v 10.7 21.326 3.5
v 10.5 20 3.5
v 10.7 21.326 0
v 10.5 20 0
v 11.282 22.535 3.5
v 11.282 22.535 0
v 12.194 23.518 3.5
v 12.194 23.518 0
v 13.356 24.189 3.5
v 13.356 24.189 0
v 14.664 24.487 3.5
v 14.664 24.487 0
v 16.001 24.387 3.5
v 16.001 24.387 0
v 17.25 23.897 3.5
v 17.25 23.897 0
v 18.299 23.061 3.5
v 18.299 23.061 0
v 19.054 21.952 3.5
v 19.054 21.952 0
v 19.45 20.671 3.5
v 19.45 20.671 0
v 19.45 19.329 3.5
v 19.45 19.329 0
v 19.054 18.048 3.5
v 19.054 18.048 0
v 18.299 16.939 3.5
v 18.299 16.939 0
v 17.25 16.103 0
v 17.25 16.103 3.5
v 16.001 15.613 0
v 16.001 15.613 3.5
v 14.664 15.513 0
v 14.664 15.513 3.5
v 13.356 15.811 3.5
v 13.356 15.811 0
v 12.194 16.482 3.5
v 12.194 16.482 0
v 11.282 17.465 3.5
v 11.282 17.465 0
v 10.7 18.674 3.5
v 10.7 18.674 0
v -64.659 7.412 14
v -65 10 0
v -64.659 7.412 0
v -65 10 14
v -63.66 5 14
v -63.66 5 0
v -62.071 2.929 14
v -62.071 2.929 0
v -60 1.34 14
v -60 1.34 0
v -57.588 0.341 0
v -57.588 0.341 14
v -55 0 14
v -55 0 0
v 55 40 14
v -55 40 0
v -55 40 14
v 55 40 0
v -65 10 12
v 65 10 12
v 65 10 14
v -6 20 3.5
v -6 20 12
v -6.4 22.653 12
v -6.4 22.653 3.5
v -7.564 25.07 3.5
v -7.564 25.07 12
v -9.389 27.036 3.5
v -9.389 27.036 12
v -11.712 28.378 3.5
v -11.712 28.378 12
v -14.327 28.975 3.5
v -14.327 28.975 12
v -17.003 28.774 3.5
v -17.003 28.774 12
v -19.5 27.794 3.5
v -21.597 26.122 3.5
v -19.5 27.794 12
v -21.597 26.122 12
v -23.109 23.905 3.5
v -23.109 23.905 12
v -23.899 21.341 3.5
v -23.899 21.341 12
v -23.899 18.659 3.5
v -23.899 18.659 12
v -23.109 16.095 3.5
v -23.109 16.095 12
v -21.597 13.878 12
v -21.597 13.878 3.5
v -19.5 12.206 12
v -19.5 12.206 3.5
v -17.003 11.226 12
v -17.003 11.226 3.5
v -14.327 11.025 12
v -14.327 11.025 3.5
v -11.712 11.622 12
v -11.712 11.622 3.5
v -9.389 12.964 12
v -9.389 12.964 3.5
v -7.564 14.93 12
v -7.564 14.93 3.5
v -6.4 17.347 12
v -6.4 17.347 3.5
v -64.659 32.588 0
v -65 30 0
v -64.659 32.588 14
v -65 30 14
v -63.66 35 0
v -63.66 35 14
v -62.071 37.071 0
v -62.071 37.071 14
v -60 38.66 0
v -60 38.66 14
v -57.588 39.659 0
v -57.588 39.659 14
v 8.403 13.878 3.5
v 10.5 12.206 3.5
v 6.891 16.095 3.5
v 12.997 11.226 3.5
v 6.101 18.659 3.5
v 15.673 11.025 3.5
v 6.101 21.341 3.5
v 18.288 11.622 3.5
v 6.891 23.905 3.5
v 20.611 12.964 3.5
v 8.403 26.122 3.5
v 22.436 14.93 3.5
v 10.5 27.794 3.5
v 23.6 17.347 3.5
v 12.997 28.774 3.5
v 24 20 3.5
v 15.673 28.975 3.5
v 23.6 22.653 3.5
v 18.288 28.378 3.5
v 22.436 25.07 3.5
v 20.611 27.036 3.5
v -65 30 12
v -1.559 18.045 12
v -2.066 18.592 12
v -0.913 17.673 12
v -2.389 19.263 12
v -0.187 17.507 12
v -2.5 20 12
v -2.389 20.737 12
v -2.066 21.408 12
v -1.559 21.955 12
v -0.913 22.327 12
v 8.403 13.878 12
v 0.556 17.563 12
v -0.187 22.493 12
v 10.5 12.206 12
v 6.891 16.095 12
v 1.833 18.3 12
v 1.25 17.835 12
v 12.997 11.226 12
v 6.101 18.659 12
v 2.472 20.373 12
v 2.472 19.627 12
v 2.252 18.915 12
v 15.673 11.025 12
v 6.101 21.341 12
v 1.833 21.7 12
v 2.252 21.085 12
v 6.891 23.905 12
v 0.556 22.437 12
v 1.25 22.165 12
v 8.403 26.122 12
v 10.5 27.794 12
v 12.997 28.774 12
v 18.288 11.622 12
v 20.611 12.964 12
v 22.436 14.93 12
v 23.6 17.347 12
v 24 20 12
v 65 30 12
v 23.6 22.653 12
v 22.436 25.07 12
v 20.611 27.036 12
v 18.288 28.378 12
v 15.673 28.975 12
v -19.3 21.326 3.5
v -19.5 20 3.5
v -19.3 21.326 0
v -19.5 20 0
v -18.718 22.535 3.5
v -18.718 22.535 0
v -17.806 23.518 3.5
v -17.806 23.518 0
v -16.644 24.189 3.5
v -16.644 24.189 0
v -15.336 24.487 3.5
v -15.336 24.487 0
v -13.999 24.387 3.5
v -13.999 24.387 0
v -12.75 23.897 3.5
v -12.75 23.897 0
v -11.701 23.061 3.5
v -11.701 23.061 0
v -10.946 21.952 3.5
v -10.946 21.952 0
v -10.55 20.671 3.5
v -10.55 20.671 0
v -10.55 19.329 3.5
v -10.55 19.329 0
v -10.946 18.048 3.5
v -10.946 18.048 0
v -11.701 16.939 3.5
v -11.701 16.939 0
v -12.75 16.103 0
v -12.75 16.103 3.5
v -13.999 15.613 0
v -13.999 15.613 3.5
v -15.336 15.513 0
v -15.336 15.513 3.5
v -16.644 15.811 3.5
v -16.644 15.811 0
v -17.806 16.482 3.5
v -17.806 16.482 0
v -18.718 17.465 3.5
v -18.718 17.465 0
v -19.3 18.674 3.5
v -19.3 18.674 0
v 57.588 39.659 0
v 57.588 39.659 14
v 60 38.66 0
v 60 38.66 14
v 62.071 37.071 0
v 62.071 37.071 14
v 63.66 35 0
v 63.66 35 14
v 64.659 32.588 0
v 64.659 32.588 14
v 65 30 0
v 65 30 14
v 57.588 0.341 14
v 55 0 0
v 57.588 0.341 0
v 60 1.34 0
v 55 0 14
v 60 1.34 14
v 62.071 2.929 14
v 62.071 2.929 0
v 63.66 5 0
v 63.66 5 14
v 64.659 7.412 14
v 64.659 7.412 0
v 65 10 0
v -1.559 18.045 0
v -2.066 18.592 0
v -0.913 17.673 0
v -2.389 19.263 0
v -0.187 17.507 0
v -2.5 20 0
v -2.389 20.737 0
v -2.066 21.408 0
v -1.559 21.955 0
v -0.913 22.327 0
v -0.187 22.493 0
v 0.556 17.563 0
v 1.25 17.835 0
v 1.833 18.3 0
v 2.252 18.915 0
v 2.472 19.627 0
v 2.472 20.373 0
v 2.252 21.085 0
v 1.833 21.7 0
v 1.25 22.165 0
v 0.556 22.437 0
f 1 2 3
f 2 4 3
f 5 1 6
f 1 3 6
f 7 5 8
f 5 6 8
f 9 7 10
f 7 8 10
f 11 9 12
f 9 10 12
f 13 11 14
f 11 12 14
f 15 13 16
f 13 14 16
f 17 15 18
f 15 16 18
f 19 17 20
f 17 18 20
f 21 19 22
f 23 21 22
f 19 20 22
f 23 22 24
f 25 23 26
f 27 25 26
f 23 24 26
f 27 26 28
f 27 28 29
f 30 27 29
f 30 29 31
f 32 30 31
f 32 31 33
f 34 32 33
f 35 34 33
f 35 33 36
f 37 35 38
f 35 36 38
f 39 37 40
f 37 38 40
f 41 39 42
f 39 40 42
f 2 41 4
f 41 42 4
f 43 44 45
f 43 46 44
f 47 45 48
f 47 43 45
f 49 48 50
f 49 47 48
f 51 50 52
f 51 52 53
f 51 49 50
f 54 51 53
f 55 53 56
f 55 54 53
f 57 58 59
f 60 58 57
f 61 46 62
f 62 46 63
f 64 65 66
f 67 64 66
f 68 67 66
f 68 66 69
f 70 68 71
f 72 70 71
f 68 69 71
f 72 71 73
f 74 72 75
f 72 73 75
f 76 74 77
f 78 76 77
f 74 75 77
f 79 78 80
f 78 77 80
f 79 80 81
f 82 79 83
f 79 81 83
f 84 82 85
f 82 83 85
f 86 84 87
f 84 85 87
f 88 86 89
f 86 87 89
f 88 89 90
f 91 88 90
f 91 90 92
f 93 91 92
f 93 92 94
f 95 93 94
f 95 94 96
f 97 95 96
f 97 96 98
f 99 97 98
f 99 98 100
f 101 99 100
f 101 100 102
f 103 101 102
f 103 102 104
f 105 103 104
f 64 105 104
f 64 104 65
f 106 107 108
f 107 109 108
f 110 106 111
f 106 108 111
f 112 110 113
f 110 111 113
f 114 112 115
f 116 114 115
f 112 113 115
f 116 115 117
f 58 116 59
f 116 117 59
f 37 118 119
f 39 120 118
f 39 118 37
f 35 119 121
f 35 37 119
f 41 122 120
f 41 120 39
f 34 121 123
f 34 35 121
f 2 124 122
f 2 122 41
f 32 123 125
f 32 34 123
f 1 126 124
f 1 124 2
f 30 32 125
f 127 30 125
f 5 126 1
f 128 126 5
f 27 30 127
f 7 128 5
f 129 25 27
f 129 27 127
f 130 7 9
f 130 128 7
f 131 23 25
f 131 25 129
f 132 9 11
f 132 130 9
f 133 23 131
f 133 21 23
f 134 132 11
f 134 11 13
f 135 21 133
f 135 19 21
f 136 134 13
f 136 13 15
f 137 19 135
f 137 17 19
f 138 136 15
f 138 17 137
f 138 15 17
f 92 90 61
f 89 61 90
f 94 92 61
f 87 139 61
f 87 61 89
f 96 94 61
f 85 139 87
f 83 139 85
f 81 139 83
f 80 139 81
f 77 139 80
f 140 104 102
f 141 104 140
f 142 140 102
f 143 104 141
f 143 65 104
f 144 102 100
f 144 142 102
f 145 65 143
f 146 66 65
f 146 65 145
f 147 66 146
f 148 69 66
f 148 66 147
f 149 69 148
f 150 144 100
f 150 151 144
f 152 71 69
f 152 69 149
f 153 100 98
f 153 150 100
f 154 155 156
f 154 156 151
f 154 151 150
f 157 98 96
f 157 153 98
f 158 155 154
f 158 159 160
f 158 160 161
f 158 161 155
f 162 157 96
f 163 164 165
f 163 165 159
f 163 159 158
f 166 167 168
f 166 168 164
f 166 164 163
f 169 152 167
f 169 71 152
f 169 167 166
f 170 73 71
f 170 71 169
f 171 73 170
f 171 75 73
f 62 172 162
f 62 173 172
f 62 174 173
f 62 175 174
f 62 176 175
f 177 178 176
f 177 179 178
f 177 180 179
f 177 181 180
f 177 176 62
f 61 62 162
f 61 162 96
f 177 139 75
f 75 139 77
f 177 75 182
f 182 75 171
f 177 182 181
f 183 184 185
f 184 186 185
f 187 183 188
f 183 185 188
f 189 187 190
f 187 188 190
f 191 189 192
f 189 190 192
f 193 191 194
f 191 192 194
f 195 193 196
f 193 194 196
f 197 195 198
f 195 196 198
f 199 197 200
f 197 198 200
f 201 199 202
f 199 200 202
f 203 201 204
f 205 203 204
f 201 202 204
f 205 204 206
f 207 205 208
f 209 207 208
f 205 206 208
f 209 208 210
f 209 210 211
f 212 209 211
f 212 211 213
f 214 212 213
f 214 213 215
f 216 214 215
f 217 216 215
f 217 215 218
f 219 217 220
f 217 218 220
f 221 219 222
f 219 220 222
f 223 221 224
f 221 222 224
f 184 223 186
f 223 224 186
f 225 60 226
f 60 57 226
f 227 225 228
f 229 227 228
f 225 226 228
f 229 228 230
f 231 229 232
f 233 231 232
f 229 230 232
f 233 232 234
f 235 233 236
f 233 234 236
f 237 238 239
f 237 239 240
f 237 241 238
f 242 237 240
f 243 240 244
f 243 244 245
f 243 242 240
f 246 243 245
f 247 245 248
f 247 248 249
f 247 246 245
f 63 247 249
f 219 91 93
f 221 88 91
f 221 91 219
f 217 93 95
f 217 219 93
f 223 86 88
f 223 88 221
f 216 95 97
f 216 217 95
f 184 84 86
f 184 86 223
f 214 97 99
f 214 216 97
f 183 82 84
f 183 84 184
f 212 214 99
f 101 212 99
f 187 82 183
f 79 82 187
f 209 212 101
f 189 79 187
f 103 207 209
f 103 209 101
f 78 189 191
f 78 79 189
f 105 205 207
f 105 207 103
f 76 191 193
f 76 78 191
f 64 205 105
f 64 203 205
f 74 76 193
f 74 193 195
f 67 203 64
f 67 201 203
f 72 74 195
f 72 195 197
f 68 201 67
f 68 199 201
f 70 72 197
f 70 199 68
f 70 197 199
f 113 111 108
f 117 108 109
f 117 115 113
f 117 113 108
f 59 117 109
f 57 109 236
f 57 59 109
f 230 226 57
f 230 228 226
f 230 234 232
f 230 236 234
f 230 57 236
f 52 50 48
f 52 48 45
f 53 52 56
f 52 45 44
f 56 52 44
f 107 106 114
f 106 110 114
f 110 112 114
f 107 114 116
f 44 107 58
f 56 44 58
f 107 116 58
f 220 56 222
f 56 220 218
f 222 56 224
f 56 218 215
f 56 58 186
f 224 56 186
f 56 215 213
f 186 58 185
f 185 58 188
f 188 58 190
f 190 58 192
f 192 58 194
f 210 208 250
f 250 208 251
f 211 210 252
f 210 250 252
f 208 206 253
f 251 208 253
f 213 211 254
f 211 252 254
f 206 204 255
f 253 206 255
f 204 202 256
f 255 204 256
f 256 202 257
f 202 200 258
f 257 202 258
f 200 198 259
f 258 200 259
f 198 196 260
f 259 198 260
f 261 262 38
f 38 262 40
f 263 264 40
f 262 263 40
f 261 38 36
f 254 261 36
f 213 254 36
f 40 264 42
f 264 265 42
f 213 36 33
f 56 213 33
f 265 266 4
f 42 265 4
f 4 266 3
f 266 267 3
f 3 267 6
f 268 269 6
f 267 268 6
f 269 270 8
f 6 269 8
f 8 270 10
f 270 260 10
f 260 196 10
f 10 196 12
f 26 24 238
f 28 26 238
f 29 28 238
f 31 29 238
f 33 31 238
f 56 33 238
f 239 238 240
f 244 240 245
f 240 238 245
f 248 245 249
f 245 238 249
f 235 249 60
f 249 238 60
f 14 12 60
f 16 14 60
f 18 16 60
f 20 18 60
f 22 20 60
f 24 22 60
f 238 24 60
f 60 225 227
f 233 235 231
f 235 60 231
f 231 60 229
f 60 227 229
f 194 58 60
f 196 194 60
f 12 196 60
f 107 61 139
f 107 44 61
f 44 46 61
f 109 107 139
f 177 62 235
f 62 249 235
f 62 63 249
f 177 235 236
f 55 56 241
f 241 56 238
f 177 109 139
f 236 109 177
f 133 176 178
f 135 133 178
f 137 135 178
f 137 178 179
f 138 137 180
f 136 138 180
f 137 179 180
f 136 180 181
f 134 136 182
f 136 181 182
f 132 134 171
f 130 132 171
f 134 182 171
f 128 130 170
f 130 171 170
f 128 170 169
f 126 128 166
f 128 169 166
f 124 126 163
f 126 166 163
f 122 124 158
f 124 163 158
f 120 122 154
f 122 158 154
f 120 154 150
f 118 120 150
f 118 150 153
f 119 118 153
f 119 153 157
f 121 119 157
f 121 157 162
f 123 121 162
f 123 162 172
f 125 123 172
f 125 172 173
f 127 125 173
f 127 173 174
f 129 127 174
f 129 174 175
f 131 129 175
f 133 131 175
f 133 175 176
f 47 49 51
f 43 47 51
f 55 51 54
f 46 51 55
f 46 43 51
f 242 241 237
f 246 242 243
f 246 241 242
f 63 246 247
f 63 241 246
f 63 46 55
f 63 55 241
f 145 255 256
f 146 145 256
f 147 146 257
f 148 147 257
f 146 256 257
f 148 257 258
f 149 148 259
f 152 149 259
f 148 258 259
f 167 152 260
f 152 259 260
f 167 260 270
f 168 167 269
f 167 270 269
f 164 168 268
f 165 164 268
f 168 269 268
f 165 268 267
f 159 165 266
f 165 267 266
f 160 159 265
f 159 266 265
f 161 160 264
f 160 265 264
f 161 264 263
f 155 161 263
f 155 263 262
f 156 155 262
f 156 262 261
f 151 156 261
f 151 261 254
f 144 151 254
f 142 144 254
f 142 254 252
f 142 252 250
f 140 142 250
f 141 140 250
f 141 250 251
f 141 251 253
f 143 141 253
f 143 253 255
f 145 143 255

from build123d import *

# Parameters (mm, degrees)
SKETCH_1_W                   = 130
SKETCH_1_H                   = 40
EXTRUDE_1_DEPTH              = 14
HOLE_WIZARD_M6_1_D           = 5
SKETCH_8_W                   = 130
SKETCH_8_H                   = 20
CUT_EXTRUDE_1_DEPTH          = 2
HOLE_WIZARD_M8_1_D           = 9
HOLE_WIZARD_M8_1_CBORE_D     = 18
HOLE_WIZARD_M8_1_CBORE_DEPTH = 8.5
FILLET_1_R                   = 10


with BuildPart() as part:
    # 草图1 → 凸台-拉伸1 (new body)
    with BuildSketch(Plane.XY):
        with Locations((0, 20)):
            Rectangle(SKETCH_1_W, SKETCH_1_H)
    extrude(amount=EXTRUDE_1_DEPTH)

    # M6 螺纹孔1 (through all)
    with Locations(Plane.XY.offset(14)):
        with Locations((0, 20)):
            Hole(HOLE_WIZARD_M6_1_D / 2)

    # 草图8 → 切除-拉伸1 (cut)
    with BuildSketch(Plane.XY.offset(14)):
        with Locations((0, 20)):
            Rectangle(SKETCH_8_W, SKETCH_8_H)
    extrude(amount=-CUT_EXTRUDE_1_DEPTH, mode=Mode.SUBTRACT)

    # M8 六角头螺栓的柱形沉头孔1 (through all)
    with Locations(Plane.XY.offset(12)):
        with Locations((-15, 20), (15, 20)):
            CounterBoreHole(HOLE_WIZARD_M8_1_D / 2, HOLE_WIZARD_M8_1_CBORE_D / 2, HOLE_WIZARD_M8_1_CBORE_DEPTH)

    # 圆角1
    fillet_1_edges = [part.edges().sort_by_distance(p)[0] for p in [
        (65, 0, 7),
        (65, 40, 7),
        (-65, 0, 7),
        (-65, 40, 7),
    ]]
    fillet(fillet_1_edges, radius=FILLET_1_R - 0.0001)  # a hair under: the kernel refuses the full size


solid = part.part
